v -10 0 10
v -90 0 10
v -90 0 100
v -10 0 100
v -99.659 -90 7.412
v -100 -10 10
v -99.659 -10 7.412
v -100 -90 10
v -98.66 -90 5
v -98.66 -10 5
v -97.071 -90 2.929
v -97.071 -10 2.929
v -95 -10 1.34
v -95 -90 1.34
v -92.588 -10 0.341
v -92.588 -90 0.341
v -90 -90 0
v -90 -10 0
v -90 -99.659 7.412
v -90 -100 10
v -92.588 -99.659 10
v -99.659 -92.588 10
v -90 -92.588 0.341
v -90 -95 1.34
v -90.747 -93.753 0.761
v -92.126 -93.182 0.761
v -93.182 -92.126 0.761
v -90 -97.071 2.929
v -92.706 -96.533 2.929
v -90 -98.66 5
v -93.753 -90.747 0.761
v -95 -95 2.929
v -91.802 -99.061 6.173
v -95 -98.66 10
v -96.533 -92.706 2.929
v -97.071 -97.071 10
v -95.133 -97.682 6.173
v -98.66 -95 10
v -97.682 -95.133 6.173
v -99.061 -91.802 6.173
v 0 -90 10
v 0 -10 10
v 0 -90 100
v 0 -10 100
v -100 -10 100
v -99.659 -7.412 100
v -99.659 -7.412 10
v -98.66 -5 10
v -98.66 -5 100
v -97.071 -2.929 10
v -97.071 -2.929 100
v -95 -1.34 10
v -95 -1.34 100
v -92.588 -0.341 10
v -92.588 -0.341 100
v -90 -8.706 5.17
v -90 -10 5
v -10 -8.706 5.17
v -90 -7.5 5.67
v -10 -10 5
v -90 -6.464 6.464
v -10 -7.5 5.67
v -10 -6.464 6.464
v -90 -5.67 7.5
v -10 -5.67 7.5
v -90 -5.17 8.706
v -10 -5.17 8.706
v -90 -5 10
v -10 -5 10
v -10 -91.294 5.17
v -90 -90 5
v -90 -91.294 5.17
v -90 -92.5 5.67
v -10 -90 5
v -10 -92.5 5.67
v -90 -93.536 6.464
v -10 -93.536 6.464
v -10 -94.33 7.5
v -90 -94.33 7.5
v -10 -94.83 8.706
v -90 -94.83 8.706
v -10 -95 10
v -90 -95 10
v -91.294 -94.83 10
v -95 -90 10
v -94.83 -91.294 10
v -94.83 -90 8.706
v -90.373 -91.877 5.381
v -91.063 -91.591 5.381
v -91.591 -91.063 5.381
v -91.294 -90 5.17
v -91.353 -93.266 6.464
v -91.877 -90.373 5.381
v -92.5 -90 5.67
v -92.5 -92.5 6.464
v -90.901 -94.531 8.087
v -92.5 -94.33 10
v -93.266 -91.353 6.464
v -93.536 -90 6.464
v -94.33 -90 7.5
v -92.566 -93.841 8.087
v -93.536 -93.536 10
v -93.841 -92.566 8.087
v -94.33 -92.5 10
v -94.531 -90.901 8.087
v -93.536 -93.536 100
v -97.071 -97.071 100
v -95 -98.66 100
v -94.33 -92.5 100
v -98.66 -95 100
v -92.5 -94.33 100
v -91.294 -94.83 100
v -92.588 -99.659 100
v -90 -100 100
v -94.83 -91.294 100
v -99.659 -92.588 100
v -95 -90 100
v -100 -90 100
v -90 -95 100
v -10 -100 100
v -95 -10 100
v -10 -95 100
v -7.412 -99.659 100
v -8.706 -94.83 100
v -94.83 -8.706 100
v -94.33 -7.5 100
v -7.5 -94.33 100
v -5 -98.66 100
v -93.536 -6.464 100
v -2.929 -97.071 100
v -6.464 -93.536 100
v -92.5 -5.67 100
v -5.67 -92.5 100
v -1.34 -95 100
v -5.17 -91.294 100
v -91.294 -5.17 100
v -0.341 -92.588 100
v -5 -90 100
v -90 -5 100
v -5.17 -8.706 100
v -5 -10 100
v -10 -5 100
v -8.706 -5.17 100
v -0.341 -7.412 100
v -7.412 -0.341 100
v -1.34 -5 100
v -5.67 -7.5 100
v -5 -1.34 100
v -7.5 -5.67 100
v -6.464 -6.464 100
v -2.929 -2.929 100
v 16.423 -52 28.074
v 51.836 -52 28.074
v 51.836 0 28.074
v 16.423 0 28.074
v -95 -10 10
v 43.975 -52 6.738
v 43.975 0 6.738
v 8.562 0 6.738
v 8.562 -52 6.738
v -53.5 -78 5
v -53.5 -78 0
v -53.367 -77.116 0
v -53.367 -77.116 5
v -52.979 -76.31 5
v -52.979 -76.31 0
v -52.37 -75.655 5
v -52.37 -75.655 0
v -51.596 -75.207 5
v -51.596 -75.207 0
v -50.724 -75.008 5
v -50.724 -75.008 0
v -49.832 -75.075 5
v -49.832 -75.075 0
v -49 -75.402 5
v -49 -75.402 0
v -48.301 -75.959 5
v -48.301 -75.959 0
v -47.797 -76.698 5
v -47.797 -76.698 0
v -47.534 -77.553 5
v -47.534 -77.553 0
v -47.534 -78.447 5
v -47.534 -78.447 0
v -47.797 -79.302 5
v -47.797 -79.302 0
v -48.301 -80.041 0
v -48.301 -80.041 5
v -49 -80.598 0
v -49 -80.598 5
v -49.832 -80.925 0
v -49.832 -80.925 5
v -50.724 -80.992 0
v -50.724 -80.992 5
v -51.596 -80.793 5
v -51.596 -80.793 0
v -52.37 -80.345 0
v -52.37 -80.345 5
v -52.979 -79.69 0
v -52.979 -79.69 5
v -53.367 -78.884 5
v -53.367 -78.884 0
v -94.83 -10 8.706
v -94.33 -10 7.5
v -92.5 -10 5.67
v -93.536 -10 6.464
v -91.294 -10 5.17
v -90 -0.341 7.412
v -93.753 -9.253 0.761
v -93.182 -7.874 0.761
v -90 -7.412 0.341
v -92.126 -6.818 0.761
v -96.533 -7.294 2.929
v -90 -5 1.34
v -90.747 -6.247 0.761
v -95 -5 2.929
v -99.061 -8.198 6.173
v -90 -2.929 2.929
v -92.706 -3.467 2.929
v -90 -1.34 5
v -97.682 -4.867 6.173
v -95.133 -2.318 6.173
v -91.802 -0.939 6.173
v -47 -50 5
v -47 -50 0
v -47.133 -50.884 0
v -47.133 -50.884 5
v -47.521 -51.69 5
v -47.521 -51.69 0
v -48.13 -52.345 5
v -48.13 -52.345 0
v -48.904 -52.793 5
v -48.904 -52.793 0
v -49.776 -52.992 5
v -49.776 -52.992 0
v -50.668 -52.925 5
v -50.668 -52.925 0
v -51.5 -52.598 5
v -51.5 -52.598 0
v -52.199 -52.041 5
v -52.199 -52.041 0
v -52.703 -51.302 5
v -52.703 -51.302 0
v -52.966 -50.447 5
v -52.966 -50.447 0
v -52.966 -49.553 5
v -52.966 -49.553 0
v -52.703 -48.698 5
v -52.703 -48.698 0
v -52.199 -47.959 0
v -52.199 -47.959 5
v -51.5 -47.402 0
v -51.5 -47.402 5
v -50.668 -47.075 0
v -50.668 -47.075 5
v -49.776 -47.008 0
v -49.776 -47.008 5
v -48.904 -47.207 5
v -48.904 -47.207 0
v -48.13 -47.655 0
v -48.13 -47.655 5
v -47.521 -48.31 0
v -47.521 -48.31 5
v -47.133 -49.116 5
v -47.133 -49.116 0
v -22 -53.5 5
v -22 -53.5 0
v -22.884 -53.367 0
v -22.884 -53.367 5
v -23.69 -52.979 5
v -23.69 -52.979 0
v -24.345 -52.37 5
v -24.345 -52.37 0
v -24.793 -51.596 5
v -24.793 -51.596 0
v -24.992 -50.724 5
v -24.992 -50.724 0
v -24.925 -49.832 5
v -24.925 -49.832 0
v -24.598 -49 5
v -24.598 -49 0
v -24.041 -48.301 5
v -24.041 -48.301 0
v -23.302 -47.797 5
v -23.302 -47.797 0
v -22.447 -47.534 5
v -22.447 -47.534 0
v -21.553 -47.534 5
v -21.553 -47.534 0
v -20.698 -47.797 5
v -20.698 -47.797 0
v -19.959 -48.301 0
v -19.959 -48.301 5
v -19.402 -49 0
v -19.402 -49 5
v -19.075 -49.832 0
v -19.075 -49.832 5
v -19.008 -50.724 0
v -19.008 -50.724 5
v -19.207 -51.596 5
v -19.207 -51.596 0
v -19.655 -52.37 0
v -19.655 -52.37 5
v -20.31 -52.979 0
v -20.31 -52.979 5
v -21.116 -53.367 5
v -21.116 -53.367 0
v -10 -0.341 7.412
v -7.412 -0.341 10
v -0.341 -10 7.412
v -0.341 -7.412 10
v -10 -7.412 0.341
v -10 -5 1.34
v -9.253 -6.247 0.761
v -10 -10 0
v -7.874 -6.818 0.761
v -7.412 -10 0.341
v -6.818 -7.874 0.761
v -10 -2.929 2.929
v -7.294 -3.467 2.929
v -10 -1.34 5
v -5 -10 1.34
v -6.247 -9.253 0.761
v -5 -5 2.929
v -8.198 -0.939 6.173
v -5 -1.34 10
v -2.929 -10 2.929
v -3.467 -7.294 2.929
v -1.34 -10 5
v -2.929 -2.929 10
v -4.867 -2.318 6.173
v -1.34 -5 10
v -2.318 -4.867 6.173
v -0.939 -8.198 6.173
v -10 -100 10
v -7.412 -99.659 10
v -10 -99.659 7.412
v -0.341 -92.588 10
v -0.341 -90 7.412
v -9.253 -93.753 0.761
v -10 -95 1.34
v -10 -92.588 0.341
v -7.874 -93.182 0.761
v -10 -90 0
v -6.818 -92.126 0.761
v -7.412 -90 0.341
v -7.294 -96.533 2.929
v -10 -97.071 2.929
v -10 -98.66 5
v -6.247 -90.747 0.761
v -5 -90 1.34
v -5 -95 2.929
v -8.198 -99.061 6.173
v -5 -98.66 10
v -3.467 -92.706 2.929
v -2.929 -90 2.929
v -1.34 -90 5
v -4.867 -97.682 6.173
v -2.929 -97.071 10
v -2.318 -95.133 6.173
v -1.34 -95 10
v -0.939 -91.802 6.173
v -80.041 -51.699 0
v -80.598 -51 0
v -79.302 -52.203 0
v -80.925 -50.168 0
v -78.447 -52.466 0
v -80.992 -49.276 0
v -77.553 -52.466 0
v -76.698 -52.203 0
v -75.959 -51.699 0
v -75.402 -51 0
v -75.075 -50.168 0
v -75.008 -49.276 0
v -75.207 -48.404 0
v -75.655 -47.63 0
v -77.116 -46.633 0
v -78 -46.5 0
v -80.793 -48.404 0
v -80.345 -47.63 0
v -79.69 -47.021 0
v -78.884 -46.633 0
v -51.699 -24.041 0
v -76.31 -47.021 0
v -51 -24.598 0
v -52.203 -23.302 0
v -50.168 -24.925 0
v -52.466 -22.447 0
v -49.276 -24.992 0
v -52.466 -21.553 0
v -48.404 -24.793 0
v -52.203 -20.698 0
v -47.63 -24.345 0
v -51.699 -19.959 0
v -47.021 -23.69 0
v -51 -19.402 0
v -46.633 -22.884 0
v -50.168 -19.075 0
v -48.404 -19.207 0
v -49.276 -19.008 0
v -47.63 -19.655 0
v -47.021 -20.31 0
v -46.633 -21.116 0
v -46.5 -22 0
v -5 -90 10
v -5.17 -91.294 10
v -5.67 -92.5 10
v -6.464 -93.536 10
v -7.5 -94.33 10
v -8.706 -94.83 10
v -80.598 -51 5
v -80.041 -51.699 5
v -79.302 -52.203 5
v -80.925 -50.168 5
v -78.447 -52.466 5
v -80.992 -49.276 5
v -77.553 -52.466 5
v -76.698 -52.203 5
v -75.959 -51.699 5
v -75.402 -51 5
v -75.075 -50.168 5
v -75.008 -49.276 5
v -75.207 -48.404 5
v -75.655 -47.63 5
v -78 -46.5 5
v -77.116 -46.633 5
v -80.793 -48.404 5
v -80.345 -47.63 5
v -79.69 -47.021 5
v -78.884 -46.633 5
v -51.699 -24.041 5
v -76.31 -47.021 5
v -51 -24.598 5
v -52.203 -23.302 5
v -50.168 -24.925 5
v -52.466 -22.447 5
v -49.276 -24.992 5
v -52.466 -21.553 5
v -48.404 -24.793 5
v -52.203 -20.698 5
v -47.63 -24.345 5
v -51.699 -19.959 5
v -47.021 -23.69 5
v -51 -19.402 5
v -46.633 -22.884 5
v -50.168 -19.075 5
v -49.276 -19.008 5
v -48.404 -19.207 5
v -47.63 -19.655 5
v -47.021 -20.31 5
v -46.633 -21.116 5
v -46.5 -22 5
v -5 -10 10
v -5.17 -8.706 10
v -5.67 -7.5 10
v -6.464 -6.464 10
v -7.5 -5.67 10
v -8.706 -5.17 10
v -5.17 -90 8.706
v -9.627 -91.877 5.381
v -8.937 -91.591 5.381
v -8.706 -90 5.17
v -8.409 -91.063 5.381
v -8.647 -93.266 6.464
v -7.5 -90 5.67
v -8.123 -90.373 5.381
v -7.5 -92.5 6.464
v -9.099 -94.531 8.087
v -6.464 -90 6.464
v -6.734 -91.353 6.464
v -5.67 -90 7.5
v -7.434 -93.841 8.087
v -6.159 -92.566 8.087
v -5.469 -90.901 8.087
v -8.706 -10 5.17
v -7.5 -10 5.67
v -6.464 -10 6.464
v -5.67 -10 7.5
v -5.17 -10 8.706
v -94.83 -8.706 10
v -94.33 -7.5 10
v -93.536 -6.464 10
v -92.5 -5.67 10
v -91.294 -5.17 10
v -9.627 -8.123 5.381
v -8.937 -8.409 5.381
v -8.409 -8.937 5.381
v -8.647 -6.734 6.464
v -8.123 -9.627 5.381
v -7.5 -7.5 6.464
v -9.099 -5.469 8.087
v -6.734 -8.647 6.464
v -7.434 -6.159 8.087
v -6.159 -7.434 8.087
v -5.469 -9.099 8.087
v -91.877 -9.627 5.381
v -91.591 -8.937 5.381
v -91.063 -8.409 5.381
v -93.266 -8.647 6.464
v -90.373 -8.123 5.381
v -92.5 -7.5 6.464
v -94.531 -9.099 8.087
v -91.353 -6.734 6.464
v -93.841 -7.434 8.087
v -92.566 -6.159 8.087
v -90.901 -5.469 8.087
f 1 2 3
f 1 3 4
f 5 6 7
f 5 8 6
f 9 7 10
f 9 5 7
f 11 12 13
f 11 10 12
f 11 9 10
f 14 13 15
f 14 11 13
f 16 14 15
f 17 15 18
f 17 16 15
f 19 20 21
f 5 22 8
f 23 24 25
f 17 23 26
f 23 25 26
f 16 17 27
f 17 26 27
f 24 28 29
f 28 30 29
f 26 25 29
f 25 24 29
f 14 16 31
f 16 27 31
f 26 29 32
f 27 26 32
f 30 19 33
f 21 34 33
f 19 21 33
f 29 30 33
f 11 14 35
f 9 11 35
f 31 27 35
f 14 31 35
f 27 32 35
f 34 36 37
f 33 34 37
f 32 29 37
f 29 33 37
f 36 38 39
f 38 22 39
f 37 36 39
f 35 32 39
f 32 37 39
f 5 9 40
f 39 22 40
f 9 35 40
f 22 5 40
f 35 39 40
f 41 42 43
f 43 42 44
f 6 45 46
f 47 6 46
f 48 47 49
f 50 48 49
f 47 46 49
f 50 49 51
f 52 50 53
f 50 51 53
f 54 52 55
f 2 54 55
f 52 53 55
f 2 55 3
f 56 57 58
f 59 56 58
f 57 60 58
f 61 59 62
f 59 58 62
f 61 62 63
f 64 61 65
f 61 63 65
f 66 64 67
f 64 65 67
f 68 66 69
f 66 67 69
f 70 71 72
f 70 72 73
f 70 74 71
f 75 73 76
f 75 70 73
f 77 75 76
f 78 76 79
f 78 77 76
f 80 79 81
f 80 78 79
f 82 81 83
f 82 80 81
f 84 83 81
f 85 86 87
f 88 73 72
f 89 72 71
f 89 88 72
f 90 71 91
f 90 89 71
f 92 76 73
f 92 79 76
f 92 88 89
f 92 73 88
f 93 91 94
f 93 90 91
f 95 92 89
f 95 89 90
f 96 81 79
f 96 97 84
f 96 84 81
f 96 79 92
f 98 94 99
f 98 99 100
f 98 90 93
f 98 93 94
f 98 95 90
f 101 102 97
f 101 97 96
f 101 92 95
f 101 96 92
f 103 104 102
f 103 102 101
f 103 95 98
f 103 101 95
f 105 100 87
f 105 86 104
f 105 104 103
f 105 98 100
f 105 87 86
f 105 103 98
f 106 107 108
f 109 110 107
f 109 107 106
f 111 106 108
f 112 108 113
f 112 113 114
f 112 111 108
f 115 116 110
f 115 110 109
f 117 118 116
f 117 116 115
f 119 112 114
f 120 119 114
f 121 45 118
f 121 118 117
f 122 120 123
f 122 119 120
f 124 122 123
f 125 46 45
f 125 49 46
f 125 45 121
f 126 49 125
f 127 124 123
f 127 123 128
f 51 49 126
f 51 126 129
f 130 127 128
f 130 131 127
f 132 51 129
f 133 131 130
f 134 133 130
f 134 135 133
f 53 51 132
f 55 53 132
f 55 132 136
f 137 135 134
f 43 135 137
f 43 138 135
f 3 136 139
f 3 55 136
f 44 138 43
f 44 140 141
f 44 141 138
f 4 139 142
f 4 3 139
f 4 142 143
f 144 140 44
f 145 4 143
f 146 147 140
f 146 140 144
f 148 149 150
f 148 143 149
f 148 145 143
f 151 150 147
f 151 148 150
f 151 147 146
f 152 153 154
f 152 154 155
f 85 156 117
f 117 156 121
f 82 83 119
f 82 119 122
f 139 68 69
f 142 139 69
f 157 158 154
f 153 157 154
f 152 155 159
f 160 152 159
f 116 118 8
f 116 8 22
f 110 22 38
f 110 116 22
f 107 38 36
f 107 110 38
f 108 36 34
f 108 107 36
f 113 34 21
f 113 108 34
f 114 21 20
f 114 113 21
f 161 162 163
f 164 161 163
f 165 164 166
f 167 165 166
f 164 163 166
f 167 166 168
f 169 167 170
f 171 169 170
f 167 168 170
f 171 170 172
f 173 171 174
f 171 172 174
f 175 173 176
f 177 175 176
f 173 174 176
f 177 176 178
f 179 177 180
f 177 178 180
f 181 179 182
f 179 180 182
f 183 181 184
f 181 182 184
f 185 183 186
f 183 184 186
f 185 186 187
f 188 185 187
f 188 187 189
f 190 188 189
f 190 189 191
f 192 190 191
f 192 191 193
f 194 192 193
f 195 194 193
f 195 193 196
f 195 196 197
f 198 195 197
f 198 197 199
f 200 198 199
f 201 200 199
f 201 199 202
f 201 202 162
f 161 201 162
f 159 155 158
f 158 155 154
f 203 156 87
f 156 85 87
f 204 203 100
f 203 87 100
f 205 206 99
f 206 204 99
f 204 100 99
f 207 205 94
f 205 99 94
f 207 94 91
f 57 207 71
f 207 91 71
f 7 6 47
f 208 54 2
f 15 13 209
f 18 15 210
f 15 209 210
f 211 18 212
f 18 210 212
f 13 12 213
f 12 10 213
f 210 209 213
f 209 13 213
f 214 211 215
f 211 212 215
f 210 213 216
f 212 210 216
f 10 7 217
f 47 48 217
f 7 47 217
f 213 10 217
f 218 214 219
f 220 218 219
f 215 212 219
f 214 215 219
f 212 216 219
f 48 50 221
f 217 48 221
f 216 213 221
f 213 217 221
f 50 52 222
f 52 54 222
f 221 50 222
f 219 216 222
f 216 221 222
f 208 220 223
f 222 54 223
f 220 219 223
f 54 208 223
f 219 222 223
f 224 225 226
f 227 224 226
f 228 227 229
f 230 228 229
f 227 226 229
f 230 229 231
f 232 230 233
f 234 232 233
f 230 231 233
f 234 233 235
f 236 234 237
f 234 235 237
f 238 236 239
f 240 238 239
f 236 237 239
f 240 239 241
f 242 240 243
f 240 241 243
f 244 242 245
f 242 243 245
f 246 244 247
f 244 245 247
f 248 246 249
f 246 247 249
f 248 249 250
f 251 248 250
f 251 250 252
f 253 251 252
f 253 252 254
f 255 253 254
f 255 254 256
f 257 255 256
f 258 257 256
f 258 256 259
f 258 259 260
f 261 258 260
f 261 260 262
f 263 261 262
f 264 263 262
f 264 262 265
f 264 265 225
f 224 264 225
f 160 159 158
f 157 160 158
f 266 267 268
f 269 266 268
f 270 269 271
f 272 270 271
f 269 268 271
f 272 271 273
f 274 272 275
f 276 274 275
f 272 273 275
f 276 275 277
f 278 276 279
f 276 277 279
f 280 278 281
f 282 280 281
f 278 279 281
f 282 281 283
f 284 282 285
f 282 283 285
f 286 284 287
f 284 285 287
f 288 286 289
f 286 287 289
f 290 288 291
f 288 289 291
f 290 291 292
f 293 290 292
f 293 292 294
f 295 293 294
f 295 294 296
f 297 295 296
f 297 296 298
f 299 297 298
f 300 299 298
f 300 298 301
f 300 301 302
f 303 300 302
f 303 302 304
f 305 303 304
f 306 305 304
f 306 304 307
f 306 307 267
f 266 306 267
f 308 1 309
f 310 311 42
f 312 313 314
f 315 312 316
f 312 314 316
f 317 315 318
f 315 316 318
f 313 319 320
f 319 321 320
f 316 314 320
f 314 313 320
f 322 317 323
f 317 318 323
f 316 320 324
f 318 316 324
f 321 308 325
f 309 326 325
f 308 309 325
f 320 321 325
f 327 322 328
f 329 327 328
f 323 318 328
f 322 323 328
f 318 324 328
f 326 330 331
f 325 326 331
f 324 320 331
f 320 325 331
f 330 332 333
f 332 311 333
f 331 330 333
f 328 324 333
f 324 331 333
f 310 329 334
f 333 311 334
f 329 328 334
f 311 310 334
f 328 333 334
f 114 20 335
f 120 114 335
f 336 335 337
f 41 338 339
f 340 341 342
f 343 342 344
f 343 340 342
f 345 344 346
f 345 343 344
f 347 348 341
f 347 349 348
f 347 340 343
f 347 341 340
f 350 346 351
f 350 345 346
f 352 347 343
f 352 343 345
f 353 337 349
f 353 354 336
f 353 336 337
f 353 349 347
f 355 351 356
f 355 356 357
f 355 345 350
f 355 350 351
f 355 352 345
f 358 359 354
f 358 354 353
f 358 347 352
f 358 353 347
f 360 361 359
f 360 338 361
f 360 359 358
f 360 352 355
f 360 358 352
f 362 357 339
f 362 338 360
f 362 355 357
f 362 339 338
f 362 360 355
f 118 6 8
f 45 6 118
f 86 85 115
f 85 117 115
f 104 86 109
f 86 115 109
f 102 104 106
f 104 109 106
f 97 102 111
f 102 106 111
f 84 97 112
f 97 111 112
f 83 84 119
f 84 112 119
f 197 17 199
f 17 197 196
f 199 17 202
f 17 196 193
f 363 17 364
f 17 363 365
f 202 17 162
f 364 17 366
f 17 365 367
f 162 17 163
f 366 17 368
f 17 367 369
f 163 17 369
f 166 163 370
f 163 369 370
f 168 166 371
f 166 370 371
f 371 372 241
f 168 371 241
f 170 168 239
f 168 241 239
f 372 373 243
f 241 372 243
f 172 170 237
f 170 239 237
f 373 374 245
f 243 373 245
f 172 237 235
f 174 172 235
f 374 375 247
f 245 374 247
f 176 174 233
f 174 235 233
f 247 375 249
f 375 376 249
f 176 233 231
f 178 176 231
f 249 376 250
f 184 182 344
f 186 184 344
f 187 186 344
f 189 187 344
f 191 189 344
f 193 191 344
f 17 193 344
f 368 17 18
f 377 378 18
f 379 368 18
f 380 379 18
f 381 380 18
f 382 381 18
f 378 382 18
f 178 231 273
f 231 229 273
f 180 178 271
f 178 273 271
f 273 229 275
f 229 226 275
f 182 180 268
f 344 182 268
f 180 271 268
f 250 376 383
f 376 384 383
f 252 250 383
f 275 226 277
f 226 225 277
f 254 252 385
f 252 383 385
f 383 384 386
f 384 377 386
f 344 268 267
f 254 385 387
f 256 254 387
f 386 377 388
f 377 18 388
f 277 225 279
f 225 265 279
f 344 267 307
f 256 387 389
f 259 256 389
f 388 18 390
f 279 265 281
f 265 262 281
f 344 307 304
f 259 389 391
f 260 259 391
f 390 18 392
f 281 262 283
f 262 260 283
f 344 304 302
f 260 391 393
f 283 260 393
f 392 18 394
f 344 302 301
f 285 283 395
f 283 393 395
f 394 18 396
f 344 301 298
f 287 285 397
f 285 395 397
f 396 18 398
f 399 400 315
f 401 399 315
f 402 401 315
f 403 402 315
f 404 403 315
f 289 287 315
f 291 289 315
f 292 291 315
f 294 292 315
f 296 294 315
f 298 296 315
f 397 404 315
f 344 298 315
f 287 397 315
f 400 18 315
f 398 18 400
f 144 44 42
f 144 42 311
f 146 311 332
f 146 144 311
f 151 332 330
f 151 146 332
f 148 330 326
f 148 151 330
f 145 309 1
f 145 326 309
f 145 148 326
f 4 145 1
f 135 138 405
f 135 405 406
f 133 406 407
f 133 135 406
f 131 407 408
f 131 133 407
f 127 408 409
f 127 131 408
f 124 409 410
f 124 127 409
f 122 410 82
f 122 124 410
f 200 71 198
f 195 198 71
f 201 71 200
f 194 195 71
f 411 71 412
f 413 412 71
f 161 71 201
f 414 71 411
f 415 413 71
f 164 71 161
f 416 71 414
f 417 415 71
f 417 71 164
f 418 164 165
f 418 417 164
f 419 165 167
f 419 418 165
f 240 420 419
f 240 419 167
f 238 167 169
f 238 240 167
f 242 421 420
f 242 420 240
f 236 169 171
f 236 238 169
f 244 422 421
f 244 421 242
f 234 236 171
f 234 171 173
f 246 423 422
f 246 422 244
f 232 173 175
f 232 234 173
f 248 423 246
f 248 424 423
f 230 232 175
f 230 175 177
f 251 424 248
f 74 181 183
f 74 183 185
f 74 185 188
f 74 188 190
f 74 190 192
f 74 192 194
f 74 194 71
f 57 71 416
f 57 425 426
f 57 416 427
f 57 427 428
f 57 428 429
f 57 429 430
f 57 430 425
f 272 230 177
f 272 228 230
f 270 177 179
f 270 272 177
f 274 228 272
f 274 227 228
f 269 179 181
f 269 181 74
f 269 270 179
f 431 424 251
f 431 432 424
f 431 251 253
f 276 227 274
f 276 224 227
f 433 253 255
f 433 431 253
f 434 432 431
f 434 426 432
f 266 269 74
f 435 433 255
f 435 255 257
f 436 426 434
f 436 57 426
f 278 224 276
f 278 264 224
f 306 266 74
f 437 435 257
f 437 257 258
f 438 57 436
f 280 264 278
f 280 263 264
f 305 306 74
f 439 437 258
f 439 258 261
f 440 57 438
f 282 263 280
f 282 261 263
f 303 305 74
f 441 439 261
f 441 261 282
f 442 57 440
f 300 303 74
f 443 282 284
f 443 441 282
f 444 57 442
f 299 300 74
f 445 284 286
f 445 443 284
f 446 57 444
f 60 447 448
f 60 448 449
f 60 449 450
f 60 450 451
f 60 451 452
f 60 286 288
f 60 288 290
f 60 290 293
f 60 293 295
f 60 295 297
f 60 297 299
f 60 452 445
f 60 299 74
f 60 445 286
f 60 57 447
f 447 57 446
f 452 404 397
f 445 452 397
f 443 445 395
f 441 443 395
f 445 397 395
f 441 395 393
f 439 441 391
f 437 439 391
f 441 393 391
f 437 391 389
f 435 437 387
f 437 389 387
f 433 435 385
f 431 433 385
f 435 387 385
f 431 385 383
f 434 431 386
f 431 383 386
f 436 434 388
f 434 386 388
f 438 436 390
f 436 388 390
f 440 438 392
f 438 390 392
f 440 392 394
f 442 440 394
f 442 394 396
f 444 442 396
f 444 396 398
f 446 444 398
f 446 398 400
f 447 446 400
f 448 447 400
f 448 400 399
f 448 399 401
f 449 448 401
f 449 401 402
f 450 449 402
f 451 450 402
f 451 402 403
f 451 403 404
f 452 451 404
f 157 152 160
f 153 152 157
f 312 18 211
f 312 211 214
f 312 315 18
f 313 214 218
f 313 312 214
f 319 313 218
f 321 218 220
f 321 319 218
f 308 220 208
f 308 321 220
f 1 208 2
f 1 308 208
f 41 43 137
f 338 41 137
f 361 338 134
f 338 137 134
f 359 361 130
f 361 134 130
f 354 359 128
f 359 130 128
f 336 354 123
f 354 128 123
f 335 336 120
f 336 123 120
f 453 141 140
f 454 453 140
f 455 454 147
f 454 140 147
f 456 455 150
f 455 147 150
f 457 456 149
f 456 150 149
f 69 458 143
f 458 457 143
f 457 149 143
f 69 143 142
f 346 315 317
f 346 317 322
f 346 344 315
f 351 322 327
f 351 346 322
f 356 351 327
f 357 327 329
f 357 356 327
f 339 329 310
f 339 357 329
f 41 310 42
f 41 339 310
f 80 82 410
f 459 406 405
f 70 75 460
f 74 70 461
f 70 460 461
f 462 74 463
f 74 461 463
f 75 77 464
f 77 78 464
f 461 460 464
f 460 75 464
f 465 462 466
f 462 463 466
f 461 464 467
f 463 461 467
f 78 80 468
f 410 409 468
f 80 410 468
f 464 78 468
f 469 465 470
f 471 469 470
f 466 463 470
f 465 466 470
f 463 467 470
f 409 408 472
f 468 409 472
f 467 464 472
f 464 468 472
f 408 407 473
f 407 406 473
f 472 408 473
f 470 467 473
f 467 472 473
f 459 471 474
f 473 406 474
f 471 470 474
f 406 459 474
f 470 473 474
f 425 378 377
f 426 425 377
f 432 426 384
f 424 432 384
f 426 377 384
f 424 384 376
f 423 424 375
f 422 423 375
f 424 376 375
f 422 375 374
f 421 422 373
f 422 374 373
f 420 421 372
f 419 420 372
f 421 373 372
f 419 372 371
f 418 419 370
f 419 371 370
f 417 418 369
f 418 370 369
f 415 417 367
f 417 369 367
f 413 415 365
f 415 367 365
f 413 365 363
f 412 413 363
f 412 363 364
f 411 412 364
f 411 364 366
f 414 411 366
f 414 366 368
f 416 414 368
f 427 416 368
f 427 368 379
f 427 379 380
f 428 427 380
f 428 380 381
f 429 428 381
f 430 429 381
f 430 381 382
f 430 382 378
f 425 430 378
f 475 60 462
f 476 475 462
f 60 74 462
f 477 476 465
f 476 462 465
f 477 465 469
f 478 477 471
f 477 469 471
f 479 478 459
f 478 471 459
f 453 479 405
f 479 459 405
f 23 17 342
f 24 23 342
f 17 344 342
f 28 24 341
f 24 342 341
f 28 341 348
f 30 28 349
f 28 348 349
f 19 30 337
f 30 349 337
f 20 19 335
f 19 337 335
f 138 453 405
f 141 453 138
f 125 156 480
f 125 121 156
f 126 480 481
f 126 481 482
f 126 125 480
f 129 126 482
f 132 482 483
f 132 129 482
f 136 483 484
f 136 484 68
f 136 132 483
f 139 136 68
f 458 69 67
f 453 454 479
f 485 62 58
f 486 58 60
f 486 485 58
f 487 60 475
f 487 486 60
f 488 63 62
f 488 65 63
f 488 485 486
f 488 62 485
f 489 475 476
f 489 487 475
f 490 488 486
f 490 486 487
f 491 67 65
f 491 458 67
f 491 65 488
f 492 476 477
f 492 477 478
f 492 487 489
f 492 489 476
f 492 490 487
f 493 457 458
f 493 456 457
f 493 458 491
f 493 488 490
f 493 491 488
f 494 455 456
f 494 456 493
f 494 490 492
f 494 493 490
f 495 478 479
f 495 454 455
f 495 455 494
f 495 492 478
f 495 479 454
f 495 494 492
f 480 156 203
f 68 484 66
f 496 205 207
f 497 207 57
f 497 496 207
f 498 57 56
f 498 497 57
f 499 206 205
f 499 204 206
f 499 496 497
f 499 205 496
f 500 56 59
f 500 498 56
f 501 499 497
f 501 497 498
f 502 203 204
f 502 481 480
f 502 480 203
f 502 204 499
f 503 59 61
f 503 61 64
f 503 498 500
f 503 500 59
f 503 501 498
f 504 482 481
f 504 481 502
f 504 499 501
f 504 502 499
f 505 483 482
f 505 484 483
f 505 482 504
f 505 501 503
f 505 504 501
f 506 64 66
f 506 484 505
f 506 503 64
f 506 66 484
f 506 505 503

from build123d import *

# Parameters (mm, degrees)
F1_DEPTH        = 52
F2_W            = 100
F2_H            = 100
F3_DEPTH        = 100
F4_R            = 10
F5_T            = -5
F6_R            = 3
F7_DEPTH        = 25
F8_R            = 3
F9_DEPTH        = 25
F9_COPIES_COUNT = 4


# Not quite as in the source:
# - a pattern or mirror of a feature is missing from the dataset's text; its kind, count and spacing are read off the source's solid


with BuildPart() as f1:
    # F0 (on Front) → F1 (new body)
    with BuildSketch(Plane.XZ):
        Polygon((16.4231043309, 28.0736852437), (8.5624745116, 6.7376843654), (43.9754001059, 6.7376843654), (51.8360299253, 28.0736852437), align=None)
    extrude(amount=F1_DEPTH)


with BuildPart() as f3:
    # F2 (on Front) → F3 (new body)
    with BuildSketch(Plane.XZ):
        with Locations((-50, 50)):
            Rectangle(F2_W, F2_H)
    extrude(amount=F3_DEPTH)

    # F4
    f4_edges = [f3.edges().sort_by_distance(p)[0] for p in [
        (-100, 0, 50),
        (-100, -100, 50),
        (0, 0, 50),
        (0, -100, 50),
        (-50, -100, 0),
        (-100, -50, 0),
        (-50, 0, 0),
        (0, -50, 0),
    ]]
    fillet(f4_edges, radius=F4_R)

    # F5
    f5_openings = [f3.faces().sort_by_distance(p)[0] for p in [
        (-50, -50, 100),
    ]]
    offset(amount=F5_T, openings=f5_openings)

    # F6 (on face) → F7 (cut)
    with BuildSketch(Plane(origin=(0, 0, 0), x_dir=(1, 0, 0), z_dir=(0, 0, -1))):
        with Locations((-50, 50)):
            Circle(F6_R)
    extrude(amount=-F7_DEPTH, mode=Mode.SUBTRACT)

    # F8 (on face) → F9 (cut)
    with BuildSketch(Plane(origin=(0, 0, 0), x_dir=(1, 0, 0), z_dir=(0, 0, -1))):
        with Locations((-49.5, 22)):
            Circle(F8_R)
    f9 = extrude(amount=-F9_DEPTH, mode=Mode.SUBTRACT)

    # F9_copies: F9 ×4 about axis
    f9_copies_axis = Axis((-50, -50, 0), (0, 0, 1))
    for i in range(1, F9_COPIES_COUNT):
        add(f9.rotate(f9_copies_axis, i * 360 / F9_COPIES_COUNT), mode=Mode.SUBTRACT)


solid = Compound([f1.part, f3.part])
